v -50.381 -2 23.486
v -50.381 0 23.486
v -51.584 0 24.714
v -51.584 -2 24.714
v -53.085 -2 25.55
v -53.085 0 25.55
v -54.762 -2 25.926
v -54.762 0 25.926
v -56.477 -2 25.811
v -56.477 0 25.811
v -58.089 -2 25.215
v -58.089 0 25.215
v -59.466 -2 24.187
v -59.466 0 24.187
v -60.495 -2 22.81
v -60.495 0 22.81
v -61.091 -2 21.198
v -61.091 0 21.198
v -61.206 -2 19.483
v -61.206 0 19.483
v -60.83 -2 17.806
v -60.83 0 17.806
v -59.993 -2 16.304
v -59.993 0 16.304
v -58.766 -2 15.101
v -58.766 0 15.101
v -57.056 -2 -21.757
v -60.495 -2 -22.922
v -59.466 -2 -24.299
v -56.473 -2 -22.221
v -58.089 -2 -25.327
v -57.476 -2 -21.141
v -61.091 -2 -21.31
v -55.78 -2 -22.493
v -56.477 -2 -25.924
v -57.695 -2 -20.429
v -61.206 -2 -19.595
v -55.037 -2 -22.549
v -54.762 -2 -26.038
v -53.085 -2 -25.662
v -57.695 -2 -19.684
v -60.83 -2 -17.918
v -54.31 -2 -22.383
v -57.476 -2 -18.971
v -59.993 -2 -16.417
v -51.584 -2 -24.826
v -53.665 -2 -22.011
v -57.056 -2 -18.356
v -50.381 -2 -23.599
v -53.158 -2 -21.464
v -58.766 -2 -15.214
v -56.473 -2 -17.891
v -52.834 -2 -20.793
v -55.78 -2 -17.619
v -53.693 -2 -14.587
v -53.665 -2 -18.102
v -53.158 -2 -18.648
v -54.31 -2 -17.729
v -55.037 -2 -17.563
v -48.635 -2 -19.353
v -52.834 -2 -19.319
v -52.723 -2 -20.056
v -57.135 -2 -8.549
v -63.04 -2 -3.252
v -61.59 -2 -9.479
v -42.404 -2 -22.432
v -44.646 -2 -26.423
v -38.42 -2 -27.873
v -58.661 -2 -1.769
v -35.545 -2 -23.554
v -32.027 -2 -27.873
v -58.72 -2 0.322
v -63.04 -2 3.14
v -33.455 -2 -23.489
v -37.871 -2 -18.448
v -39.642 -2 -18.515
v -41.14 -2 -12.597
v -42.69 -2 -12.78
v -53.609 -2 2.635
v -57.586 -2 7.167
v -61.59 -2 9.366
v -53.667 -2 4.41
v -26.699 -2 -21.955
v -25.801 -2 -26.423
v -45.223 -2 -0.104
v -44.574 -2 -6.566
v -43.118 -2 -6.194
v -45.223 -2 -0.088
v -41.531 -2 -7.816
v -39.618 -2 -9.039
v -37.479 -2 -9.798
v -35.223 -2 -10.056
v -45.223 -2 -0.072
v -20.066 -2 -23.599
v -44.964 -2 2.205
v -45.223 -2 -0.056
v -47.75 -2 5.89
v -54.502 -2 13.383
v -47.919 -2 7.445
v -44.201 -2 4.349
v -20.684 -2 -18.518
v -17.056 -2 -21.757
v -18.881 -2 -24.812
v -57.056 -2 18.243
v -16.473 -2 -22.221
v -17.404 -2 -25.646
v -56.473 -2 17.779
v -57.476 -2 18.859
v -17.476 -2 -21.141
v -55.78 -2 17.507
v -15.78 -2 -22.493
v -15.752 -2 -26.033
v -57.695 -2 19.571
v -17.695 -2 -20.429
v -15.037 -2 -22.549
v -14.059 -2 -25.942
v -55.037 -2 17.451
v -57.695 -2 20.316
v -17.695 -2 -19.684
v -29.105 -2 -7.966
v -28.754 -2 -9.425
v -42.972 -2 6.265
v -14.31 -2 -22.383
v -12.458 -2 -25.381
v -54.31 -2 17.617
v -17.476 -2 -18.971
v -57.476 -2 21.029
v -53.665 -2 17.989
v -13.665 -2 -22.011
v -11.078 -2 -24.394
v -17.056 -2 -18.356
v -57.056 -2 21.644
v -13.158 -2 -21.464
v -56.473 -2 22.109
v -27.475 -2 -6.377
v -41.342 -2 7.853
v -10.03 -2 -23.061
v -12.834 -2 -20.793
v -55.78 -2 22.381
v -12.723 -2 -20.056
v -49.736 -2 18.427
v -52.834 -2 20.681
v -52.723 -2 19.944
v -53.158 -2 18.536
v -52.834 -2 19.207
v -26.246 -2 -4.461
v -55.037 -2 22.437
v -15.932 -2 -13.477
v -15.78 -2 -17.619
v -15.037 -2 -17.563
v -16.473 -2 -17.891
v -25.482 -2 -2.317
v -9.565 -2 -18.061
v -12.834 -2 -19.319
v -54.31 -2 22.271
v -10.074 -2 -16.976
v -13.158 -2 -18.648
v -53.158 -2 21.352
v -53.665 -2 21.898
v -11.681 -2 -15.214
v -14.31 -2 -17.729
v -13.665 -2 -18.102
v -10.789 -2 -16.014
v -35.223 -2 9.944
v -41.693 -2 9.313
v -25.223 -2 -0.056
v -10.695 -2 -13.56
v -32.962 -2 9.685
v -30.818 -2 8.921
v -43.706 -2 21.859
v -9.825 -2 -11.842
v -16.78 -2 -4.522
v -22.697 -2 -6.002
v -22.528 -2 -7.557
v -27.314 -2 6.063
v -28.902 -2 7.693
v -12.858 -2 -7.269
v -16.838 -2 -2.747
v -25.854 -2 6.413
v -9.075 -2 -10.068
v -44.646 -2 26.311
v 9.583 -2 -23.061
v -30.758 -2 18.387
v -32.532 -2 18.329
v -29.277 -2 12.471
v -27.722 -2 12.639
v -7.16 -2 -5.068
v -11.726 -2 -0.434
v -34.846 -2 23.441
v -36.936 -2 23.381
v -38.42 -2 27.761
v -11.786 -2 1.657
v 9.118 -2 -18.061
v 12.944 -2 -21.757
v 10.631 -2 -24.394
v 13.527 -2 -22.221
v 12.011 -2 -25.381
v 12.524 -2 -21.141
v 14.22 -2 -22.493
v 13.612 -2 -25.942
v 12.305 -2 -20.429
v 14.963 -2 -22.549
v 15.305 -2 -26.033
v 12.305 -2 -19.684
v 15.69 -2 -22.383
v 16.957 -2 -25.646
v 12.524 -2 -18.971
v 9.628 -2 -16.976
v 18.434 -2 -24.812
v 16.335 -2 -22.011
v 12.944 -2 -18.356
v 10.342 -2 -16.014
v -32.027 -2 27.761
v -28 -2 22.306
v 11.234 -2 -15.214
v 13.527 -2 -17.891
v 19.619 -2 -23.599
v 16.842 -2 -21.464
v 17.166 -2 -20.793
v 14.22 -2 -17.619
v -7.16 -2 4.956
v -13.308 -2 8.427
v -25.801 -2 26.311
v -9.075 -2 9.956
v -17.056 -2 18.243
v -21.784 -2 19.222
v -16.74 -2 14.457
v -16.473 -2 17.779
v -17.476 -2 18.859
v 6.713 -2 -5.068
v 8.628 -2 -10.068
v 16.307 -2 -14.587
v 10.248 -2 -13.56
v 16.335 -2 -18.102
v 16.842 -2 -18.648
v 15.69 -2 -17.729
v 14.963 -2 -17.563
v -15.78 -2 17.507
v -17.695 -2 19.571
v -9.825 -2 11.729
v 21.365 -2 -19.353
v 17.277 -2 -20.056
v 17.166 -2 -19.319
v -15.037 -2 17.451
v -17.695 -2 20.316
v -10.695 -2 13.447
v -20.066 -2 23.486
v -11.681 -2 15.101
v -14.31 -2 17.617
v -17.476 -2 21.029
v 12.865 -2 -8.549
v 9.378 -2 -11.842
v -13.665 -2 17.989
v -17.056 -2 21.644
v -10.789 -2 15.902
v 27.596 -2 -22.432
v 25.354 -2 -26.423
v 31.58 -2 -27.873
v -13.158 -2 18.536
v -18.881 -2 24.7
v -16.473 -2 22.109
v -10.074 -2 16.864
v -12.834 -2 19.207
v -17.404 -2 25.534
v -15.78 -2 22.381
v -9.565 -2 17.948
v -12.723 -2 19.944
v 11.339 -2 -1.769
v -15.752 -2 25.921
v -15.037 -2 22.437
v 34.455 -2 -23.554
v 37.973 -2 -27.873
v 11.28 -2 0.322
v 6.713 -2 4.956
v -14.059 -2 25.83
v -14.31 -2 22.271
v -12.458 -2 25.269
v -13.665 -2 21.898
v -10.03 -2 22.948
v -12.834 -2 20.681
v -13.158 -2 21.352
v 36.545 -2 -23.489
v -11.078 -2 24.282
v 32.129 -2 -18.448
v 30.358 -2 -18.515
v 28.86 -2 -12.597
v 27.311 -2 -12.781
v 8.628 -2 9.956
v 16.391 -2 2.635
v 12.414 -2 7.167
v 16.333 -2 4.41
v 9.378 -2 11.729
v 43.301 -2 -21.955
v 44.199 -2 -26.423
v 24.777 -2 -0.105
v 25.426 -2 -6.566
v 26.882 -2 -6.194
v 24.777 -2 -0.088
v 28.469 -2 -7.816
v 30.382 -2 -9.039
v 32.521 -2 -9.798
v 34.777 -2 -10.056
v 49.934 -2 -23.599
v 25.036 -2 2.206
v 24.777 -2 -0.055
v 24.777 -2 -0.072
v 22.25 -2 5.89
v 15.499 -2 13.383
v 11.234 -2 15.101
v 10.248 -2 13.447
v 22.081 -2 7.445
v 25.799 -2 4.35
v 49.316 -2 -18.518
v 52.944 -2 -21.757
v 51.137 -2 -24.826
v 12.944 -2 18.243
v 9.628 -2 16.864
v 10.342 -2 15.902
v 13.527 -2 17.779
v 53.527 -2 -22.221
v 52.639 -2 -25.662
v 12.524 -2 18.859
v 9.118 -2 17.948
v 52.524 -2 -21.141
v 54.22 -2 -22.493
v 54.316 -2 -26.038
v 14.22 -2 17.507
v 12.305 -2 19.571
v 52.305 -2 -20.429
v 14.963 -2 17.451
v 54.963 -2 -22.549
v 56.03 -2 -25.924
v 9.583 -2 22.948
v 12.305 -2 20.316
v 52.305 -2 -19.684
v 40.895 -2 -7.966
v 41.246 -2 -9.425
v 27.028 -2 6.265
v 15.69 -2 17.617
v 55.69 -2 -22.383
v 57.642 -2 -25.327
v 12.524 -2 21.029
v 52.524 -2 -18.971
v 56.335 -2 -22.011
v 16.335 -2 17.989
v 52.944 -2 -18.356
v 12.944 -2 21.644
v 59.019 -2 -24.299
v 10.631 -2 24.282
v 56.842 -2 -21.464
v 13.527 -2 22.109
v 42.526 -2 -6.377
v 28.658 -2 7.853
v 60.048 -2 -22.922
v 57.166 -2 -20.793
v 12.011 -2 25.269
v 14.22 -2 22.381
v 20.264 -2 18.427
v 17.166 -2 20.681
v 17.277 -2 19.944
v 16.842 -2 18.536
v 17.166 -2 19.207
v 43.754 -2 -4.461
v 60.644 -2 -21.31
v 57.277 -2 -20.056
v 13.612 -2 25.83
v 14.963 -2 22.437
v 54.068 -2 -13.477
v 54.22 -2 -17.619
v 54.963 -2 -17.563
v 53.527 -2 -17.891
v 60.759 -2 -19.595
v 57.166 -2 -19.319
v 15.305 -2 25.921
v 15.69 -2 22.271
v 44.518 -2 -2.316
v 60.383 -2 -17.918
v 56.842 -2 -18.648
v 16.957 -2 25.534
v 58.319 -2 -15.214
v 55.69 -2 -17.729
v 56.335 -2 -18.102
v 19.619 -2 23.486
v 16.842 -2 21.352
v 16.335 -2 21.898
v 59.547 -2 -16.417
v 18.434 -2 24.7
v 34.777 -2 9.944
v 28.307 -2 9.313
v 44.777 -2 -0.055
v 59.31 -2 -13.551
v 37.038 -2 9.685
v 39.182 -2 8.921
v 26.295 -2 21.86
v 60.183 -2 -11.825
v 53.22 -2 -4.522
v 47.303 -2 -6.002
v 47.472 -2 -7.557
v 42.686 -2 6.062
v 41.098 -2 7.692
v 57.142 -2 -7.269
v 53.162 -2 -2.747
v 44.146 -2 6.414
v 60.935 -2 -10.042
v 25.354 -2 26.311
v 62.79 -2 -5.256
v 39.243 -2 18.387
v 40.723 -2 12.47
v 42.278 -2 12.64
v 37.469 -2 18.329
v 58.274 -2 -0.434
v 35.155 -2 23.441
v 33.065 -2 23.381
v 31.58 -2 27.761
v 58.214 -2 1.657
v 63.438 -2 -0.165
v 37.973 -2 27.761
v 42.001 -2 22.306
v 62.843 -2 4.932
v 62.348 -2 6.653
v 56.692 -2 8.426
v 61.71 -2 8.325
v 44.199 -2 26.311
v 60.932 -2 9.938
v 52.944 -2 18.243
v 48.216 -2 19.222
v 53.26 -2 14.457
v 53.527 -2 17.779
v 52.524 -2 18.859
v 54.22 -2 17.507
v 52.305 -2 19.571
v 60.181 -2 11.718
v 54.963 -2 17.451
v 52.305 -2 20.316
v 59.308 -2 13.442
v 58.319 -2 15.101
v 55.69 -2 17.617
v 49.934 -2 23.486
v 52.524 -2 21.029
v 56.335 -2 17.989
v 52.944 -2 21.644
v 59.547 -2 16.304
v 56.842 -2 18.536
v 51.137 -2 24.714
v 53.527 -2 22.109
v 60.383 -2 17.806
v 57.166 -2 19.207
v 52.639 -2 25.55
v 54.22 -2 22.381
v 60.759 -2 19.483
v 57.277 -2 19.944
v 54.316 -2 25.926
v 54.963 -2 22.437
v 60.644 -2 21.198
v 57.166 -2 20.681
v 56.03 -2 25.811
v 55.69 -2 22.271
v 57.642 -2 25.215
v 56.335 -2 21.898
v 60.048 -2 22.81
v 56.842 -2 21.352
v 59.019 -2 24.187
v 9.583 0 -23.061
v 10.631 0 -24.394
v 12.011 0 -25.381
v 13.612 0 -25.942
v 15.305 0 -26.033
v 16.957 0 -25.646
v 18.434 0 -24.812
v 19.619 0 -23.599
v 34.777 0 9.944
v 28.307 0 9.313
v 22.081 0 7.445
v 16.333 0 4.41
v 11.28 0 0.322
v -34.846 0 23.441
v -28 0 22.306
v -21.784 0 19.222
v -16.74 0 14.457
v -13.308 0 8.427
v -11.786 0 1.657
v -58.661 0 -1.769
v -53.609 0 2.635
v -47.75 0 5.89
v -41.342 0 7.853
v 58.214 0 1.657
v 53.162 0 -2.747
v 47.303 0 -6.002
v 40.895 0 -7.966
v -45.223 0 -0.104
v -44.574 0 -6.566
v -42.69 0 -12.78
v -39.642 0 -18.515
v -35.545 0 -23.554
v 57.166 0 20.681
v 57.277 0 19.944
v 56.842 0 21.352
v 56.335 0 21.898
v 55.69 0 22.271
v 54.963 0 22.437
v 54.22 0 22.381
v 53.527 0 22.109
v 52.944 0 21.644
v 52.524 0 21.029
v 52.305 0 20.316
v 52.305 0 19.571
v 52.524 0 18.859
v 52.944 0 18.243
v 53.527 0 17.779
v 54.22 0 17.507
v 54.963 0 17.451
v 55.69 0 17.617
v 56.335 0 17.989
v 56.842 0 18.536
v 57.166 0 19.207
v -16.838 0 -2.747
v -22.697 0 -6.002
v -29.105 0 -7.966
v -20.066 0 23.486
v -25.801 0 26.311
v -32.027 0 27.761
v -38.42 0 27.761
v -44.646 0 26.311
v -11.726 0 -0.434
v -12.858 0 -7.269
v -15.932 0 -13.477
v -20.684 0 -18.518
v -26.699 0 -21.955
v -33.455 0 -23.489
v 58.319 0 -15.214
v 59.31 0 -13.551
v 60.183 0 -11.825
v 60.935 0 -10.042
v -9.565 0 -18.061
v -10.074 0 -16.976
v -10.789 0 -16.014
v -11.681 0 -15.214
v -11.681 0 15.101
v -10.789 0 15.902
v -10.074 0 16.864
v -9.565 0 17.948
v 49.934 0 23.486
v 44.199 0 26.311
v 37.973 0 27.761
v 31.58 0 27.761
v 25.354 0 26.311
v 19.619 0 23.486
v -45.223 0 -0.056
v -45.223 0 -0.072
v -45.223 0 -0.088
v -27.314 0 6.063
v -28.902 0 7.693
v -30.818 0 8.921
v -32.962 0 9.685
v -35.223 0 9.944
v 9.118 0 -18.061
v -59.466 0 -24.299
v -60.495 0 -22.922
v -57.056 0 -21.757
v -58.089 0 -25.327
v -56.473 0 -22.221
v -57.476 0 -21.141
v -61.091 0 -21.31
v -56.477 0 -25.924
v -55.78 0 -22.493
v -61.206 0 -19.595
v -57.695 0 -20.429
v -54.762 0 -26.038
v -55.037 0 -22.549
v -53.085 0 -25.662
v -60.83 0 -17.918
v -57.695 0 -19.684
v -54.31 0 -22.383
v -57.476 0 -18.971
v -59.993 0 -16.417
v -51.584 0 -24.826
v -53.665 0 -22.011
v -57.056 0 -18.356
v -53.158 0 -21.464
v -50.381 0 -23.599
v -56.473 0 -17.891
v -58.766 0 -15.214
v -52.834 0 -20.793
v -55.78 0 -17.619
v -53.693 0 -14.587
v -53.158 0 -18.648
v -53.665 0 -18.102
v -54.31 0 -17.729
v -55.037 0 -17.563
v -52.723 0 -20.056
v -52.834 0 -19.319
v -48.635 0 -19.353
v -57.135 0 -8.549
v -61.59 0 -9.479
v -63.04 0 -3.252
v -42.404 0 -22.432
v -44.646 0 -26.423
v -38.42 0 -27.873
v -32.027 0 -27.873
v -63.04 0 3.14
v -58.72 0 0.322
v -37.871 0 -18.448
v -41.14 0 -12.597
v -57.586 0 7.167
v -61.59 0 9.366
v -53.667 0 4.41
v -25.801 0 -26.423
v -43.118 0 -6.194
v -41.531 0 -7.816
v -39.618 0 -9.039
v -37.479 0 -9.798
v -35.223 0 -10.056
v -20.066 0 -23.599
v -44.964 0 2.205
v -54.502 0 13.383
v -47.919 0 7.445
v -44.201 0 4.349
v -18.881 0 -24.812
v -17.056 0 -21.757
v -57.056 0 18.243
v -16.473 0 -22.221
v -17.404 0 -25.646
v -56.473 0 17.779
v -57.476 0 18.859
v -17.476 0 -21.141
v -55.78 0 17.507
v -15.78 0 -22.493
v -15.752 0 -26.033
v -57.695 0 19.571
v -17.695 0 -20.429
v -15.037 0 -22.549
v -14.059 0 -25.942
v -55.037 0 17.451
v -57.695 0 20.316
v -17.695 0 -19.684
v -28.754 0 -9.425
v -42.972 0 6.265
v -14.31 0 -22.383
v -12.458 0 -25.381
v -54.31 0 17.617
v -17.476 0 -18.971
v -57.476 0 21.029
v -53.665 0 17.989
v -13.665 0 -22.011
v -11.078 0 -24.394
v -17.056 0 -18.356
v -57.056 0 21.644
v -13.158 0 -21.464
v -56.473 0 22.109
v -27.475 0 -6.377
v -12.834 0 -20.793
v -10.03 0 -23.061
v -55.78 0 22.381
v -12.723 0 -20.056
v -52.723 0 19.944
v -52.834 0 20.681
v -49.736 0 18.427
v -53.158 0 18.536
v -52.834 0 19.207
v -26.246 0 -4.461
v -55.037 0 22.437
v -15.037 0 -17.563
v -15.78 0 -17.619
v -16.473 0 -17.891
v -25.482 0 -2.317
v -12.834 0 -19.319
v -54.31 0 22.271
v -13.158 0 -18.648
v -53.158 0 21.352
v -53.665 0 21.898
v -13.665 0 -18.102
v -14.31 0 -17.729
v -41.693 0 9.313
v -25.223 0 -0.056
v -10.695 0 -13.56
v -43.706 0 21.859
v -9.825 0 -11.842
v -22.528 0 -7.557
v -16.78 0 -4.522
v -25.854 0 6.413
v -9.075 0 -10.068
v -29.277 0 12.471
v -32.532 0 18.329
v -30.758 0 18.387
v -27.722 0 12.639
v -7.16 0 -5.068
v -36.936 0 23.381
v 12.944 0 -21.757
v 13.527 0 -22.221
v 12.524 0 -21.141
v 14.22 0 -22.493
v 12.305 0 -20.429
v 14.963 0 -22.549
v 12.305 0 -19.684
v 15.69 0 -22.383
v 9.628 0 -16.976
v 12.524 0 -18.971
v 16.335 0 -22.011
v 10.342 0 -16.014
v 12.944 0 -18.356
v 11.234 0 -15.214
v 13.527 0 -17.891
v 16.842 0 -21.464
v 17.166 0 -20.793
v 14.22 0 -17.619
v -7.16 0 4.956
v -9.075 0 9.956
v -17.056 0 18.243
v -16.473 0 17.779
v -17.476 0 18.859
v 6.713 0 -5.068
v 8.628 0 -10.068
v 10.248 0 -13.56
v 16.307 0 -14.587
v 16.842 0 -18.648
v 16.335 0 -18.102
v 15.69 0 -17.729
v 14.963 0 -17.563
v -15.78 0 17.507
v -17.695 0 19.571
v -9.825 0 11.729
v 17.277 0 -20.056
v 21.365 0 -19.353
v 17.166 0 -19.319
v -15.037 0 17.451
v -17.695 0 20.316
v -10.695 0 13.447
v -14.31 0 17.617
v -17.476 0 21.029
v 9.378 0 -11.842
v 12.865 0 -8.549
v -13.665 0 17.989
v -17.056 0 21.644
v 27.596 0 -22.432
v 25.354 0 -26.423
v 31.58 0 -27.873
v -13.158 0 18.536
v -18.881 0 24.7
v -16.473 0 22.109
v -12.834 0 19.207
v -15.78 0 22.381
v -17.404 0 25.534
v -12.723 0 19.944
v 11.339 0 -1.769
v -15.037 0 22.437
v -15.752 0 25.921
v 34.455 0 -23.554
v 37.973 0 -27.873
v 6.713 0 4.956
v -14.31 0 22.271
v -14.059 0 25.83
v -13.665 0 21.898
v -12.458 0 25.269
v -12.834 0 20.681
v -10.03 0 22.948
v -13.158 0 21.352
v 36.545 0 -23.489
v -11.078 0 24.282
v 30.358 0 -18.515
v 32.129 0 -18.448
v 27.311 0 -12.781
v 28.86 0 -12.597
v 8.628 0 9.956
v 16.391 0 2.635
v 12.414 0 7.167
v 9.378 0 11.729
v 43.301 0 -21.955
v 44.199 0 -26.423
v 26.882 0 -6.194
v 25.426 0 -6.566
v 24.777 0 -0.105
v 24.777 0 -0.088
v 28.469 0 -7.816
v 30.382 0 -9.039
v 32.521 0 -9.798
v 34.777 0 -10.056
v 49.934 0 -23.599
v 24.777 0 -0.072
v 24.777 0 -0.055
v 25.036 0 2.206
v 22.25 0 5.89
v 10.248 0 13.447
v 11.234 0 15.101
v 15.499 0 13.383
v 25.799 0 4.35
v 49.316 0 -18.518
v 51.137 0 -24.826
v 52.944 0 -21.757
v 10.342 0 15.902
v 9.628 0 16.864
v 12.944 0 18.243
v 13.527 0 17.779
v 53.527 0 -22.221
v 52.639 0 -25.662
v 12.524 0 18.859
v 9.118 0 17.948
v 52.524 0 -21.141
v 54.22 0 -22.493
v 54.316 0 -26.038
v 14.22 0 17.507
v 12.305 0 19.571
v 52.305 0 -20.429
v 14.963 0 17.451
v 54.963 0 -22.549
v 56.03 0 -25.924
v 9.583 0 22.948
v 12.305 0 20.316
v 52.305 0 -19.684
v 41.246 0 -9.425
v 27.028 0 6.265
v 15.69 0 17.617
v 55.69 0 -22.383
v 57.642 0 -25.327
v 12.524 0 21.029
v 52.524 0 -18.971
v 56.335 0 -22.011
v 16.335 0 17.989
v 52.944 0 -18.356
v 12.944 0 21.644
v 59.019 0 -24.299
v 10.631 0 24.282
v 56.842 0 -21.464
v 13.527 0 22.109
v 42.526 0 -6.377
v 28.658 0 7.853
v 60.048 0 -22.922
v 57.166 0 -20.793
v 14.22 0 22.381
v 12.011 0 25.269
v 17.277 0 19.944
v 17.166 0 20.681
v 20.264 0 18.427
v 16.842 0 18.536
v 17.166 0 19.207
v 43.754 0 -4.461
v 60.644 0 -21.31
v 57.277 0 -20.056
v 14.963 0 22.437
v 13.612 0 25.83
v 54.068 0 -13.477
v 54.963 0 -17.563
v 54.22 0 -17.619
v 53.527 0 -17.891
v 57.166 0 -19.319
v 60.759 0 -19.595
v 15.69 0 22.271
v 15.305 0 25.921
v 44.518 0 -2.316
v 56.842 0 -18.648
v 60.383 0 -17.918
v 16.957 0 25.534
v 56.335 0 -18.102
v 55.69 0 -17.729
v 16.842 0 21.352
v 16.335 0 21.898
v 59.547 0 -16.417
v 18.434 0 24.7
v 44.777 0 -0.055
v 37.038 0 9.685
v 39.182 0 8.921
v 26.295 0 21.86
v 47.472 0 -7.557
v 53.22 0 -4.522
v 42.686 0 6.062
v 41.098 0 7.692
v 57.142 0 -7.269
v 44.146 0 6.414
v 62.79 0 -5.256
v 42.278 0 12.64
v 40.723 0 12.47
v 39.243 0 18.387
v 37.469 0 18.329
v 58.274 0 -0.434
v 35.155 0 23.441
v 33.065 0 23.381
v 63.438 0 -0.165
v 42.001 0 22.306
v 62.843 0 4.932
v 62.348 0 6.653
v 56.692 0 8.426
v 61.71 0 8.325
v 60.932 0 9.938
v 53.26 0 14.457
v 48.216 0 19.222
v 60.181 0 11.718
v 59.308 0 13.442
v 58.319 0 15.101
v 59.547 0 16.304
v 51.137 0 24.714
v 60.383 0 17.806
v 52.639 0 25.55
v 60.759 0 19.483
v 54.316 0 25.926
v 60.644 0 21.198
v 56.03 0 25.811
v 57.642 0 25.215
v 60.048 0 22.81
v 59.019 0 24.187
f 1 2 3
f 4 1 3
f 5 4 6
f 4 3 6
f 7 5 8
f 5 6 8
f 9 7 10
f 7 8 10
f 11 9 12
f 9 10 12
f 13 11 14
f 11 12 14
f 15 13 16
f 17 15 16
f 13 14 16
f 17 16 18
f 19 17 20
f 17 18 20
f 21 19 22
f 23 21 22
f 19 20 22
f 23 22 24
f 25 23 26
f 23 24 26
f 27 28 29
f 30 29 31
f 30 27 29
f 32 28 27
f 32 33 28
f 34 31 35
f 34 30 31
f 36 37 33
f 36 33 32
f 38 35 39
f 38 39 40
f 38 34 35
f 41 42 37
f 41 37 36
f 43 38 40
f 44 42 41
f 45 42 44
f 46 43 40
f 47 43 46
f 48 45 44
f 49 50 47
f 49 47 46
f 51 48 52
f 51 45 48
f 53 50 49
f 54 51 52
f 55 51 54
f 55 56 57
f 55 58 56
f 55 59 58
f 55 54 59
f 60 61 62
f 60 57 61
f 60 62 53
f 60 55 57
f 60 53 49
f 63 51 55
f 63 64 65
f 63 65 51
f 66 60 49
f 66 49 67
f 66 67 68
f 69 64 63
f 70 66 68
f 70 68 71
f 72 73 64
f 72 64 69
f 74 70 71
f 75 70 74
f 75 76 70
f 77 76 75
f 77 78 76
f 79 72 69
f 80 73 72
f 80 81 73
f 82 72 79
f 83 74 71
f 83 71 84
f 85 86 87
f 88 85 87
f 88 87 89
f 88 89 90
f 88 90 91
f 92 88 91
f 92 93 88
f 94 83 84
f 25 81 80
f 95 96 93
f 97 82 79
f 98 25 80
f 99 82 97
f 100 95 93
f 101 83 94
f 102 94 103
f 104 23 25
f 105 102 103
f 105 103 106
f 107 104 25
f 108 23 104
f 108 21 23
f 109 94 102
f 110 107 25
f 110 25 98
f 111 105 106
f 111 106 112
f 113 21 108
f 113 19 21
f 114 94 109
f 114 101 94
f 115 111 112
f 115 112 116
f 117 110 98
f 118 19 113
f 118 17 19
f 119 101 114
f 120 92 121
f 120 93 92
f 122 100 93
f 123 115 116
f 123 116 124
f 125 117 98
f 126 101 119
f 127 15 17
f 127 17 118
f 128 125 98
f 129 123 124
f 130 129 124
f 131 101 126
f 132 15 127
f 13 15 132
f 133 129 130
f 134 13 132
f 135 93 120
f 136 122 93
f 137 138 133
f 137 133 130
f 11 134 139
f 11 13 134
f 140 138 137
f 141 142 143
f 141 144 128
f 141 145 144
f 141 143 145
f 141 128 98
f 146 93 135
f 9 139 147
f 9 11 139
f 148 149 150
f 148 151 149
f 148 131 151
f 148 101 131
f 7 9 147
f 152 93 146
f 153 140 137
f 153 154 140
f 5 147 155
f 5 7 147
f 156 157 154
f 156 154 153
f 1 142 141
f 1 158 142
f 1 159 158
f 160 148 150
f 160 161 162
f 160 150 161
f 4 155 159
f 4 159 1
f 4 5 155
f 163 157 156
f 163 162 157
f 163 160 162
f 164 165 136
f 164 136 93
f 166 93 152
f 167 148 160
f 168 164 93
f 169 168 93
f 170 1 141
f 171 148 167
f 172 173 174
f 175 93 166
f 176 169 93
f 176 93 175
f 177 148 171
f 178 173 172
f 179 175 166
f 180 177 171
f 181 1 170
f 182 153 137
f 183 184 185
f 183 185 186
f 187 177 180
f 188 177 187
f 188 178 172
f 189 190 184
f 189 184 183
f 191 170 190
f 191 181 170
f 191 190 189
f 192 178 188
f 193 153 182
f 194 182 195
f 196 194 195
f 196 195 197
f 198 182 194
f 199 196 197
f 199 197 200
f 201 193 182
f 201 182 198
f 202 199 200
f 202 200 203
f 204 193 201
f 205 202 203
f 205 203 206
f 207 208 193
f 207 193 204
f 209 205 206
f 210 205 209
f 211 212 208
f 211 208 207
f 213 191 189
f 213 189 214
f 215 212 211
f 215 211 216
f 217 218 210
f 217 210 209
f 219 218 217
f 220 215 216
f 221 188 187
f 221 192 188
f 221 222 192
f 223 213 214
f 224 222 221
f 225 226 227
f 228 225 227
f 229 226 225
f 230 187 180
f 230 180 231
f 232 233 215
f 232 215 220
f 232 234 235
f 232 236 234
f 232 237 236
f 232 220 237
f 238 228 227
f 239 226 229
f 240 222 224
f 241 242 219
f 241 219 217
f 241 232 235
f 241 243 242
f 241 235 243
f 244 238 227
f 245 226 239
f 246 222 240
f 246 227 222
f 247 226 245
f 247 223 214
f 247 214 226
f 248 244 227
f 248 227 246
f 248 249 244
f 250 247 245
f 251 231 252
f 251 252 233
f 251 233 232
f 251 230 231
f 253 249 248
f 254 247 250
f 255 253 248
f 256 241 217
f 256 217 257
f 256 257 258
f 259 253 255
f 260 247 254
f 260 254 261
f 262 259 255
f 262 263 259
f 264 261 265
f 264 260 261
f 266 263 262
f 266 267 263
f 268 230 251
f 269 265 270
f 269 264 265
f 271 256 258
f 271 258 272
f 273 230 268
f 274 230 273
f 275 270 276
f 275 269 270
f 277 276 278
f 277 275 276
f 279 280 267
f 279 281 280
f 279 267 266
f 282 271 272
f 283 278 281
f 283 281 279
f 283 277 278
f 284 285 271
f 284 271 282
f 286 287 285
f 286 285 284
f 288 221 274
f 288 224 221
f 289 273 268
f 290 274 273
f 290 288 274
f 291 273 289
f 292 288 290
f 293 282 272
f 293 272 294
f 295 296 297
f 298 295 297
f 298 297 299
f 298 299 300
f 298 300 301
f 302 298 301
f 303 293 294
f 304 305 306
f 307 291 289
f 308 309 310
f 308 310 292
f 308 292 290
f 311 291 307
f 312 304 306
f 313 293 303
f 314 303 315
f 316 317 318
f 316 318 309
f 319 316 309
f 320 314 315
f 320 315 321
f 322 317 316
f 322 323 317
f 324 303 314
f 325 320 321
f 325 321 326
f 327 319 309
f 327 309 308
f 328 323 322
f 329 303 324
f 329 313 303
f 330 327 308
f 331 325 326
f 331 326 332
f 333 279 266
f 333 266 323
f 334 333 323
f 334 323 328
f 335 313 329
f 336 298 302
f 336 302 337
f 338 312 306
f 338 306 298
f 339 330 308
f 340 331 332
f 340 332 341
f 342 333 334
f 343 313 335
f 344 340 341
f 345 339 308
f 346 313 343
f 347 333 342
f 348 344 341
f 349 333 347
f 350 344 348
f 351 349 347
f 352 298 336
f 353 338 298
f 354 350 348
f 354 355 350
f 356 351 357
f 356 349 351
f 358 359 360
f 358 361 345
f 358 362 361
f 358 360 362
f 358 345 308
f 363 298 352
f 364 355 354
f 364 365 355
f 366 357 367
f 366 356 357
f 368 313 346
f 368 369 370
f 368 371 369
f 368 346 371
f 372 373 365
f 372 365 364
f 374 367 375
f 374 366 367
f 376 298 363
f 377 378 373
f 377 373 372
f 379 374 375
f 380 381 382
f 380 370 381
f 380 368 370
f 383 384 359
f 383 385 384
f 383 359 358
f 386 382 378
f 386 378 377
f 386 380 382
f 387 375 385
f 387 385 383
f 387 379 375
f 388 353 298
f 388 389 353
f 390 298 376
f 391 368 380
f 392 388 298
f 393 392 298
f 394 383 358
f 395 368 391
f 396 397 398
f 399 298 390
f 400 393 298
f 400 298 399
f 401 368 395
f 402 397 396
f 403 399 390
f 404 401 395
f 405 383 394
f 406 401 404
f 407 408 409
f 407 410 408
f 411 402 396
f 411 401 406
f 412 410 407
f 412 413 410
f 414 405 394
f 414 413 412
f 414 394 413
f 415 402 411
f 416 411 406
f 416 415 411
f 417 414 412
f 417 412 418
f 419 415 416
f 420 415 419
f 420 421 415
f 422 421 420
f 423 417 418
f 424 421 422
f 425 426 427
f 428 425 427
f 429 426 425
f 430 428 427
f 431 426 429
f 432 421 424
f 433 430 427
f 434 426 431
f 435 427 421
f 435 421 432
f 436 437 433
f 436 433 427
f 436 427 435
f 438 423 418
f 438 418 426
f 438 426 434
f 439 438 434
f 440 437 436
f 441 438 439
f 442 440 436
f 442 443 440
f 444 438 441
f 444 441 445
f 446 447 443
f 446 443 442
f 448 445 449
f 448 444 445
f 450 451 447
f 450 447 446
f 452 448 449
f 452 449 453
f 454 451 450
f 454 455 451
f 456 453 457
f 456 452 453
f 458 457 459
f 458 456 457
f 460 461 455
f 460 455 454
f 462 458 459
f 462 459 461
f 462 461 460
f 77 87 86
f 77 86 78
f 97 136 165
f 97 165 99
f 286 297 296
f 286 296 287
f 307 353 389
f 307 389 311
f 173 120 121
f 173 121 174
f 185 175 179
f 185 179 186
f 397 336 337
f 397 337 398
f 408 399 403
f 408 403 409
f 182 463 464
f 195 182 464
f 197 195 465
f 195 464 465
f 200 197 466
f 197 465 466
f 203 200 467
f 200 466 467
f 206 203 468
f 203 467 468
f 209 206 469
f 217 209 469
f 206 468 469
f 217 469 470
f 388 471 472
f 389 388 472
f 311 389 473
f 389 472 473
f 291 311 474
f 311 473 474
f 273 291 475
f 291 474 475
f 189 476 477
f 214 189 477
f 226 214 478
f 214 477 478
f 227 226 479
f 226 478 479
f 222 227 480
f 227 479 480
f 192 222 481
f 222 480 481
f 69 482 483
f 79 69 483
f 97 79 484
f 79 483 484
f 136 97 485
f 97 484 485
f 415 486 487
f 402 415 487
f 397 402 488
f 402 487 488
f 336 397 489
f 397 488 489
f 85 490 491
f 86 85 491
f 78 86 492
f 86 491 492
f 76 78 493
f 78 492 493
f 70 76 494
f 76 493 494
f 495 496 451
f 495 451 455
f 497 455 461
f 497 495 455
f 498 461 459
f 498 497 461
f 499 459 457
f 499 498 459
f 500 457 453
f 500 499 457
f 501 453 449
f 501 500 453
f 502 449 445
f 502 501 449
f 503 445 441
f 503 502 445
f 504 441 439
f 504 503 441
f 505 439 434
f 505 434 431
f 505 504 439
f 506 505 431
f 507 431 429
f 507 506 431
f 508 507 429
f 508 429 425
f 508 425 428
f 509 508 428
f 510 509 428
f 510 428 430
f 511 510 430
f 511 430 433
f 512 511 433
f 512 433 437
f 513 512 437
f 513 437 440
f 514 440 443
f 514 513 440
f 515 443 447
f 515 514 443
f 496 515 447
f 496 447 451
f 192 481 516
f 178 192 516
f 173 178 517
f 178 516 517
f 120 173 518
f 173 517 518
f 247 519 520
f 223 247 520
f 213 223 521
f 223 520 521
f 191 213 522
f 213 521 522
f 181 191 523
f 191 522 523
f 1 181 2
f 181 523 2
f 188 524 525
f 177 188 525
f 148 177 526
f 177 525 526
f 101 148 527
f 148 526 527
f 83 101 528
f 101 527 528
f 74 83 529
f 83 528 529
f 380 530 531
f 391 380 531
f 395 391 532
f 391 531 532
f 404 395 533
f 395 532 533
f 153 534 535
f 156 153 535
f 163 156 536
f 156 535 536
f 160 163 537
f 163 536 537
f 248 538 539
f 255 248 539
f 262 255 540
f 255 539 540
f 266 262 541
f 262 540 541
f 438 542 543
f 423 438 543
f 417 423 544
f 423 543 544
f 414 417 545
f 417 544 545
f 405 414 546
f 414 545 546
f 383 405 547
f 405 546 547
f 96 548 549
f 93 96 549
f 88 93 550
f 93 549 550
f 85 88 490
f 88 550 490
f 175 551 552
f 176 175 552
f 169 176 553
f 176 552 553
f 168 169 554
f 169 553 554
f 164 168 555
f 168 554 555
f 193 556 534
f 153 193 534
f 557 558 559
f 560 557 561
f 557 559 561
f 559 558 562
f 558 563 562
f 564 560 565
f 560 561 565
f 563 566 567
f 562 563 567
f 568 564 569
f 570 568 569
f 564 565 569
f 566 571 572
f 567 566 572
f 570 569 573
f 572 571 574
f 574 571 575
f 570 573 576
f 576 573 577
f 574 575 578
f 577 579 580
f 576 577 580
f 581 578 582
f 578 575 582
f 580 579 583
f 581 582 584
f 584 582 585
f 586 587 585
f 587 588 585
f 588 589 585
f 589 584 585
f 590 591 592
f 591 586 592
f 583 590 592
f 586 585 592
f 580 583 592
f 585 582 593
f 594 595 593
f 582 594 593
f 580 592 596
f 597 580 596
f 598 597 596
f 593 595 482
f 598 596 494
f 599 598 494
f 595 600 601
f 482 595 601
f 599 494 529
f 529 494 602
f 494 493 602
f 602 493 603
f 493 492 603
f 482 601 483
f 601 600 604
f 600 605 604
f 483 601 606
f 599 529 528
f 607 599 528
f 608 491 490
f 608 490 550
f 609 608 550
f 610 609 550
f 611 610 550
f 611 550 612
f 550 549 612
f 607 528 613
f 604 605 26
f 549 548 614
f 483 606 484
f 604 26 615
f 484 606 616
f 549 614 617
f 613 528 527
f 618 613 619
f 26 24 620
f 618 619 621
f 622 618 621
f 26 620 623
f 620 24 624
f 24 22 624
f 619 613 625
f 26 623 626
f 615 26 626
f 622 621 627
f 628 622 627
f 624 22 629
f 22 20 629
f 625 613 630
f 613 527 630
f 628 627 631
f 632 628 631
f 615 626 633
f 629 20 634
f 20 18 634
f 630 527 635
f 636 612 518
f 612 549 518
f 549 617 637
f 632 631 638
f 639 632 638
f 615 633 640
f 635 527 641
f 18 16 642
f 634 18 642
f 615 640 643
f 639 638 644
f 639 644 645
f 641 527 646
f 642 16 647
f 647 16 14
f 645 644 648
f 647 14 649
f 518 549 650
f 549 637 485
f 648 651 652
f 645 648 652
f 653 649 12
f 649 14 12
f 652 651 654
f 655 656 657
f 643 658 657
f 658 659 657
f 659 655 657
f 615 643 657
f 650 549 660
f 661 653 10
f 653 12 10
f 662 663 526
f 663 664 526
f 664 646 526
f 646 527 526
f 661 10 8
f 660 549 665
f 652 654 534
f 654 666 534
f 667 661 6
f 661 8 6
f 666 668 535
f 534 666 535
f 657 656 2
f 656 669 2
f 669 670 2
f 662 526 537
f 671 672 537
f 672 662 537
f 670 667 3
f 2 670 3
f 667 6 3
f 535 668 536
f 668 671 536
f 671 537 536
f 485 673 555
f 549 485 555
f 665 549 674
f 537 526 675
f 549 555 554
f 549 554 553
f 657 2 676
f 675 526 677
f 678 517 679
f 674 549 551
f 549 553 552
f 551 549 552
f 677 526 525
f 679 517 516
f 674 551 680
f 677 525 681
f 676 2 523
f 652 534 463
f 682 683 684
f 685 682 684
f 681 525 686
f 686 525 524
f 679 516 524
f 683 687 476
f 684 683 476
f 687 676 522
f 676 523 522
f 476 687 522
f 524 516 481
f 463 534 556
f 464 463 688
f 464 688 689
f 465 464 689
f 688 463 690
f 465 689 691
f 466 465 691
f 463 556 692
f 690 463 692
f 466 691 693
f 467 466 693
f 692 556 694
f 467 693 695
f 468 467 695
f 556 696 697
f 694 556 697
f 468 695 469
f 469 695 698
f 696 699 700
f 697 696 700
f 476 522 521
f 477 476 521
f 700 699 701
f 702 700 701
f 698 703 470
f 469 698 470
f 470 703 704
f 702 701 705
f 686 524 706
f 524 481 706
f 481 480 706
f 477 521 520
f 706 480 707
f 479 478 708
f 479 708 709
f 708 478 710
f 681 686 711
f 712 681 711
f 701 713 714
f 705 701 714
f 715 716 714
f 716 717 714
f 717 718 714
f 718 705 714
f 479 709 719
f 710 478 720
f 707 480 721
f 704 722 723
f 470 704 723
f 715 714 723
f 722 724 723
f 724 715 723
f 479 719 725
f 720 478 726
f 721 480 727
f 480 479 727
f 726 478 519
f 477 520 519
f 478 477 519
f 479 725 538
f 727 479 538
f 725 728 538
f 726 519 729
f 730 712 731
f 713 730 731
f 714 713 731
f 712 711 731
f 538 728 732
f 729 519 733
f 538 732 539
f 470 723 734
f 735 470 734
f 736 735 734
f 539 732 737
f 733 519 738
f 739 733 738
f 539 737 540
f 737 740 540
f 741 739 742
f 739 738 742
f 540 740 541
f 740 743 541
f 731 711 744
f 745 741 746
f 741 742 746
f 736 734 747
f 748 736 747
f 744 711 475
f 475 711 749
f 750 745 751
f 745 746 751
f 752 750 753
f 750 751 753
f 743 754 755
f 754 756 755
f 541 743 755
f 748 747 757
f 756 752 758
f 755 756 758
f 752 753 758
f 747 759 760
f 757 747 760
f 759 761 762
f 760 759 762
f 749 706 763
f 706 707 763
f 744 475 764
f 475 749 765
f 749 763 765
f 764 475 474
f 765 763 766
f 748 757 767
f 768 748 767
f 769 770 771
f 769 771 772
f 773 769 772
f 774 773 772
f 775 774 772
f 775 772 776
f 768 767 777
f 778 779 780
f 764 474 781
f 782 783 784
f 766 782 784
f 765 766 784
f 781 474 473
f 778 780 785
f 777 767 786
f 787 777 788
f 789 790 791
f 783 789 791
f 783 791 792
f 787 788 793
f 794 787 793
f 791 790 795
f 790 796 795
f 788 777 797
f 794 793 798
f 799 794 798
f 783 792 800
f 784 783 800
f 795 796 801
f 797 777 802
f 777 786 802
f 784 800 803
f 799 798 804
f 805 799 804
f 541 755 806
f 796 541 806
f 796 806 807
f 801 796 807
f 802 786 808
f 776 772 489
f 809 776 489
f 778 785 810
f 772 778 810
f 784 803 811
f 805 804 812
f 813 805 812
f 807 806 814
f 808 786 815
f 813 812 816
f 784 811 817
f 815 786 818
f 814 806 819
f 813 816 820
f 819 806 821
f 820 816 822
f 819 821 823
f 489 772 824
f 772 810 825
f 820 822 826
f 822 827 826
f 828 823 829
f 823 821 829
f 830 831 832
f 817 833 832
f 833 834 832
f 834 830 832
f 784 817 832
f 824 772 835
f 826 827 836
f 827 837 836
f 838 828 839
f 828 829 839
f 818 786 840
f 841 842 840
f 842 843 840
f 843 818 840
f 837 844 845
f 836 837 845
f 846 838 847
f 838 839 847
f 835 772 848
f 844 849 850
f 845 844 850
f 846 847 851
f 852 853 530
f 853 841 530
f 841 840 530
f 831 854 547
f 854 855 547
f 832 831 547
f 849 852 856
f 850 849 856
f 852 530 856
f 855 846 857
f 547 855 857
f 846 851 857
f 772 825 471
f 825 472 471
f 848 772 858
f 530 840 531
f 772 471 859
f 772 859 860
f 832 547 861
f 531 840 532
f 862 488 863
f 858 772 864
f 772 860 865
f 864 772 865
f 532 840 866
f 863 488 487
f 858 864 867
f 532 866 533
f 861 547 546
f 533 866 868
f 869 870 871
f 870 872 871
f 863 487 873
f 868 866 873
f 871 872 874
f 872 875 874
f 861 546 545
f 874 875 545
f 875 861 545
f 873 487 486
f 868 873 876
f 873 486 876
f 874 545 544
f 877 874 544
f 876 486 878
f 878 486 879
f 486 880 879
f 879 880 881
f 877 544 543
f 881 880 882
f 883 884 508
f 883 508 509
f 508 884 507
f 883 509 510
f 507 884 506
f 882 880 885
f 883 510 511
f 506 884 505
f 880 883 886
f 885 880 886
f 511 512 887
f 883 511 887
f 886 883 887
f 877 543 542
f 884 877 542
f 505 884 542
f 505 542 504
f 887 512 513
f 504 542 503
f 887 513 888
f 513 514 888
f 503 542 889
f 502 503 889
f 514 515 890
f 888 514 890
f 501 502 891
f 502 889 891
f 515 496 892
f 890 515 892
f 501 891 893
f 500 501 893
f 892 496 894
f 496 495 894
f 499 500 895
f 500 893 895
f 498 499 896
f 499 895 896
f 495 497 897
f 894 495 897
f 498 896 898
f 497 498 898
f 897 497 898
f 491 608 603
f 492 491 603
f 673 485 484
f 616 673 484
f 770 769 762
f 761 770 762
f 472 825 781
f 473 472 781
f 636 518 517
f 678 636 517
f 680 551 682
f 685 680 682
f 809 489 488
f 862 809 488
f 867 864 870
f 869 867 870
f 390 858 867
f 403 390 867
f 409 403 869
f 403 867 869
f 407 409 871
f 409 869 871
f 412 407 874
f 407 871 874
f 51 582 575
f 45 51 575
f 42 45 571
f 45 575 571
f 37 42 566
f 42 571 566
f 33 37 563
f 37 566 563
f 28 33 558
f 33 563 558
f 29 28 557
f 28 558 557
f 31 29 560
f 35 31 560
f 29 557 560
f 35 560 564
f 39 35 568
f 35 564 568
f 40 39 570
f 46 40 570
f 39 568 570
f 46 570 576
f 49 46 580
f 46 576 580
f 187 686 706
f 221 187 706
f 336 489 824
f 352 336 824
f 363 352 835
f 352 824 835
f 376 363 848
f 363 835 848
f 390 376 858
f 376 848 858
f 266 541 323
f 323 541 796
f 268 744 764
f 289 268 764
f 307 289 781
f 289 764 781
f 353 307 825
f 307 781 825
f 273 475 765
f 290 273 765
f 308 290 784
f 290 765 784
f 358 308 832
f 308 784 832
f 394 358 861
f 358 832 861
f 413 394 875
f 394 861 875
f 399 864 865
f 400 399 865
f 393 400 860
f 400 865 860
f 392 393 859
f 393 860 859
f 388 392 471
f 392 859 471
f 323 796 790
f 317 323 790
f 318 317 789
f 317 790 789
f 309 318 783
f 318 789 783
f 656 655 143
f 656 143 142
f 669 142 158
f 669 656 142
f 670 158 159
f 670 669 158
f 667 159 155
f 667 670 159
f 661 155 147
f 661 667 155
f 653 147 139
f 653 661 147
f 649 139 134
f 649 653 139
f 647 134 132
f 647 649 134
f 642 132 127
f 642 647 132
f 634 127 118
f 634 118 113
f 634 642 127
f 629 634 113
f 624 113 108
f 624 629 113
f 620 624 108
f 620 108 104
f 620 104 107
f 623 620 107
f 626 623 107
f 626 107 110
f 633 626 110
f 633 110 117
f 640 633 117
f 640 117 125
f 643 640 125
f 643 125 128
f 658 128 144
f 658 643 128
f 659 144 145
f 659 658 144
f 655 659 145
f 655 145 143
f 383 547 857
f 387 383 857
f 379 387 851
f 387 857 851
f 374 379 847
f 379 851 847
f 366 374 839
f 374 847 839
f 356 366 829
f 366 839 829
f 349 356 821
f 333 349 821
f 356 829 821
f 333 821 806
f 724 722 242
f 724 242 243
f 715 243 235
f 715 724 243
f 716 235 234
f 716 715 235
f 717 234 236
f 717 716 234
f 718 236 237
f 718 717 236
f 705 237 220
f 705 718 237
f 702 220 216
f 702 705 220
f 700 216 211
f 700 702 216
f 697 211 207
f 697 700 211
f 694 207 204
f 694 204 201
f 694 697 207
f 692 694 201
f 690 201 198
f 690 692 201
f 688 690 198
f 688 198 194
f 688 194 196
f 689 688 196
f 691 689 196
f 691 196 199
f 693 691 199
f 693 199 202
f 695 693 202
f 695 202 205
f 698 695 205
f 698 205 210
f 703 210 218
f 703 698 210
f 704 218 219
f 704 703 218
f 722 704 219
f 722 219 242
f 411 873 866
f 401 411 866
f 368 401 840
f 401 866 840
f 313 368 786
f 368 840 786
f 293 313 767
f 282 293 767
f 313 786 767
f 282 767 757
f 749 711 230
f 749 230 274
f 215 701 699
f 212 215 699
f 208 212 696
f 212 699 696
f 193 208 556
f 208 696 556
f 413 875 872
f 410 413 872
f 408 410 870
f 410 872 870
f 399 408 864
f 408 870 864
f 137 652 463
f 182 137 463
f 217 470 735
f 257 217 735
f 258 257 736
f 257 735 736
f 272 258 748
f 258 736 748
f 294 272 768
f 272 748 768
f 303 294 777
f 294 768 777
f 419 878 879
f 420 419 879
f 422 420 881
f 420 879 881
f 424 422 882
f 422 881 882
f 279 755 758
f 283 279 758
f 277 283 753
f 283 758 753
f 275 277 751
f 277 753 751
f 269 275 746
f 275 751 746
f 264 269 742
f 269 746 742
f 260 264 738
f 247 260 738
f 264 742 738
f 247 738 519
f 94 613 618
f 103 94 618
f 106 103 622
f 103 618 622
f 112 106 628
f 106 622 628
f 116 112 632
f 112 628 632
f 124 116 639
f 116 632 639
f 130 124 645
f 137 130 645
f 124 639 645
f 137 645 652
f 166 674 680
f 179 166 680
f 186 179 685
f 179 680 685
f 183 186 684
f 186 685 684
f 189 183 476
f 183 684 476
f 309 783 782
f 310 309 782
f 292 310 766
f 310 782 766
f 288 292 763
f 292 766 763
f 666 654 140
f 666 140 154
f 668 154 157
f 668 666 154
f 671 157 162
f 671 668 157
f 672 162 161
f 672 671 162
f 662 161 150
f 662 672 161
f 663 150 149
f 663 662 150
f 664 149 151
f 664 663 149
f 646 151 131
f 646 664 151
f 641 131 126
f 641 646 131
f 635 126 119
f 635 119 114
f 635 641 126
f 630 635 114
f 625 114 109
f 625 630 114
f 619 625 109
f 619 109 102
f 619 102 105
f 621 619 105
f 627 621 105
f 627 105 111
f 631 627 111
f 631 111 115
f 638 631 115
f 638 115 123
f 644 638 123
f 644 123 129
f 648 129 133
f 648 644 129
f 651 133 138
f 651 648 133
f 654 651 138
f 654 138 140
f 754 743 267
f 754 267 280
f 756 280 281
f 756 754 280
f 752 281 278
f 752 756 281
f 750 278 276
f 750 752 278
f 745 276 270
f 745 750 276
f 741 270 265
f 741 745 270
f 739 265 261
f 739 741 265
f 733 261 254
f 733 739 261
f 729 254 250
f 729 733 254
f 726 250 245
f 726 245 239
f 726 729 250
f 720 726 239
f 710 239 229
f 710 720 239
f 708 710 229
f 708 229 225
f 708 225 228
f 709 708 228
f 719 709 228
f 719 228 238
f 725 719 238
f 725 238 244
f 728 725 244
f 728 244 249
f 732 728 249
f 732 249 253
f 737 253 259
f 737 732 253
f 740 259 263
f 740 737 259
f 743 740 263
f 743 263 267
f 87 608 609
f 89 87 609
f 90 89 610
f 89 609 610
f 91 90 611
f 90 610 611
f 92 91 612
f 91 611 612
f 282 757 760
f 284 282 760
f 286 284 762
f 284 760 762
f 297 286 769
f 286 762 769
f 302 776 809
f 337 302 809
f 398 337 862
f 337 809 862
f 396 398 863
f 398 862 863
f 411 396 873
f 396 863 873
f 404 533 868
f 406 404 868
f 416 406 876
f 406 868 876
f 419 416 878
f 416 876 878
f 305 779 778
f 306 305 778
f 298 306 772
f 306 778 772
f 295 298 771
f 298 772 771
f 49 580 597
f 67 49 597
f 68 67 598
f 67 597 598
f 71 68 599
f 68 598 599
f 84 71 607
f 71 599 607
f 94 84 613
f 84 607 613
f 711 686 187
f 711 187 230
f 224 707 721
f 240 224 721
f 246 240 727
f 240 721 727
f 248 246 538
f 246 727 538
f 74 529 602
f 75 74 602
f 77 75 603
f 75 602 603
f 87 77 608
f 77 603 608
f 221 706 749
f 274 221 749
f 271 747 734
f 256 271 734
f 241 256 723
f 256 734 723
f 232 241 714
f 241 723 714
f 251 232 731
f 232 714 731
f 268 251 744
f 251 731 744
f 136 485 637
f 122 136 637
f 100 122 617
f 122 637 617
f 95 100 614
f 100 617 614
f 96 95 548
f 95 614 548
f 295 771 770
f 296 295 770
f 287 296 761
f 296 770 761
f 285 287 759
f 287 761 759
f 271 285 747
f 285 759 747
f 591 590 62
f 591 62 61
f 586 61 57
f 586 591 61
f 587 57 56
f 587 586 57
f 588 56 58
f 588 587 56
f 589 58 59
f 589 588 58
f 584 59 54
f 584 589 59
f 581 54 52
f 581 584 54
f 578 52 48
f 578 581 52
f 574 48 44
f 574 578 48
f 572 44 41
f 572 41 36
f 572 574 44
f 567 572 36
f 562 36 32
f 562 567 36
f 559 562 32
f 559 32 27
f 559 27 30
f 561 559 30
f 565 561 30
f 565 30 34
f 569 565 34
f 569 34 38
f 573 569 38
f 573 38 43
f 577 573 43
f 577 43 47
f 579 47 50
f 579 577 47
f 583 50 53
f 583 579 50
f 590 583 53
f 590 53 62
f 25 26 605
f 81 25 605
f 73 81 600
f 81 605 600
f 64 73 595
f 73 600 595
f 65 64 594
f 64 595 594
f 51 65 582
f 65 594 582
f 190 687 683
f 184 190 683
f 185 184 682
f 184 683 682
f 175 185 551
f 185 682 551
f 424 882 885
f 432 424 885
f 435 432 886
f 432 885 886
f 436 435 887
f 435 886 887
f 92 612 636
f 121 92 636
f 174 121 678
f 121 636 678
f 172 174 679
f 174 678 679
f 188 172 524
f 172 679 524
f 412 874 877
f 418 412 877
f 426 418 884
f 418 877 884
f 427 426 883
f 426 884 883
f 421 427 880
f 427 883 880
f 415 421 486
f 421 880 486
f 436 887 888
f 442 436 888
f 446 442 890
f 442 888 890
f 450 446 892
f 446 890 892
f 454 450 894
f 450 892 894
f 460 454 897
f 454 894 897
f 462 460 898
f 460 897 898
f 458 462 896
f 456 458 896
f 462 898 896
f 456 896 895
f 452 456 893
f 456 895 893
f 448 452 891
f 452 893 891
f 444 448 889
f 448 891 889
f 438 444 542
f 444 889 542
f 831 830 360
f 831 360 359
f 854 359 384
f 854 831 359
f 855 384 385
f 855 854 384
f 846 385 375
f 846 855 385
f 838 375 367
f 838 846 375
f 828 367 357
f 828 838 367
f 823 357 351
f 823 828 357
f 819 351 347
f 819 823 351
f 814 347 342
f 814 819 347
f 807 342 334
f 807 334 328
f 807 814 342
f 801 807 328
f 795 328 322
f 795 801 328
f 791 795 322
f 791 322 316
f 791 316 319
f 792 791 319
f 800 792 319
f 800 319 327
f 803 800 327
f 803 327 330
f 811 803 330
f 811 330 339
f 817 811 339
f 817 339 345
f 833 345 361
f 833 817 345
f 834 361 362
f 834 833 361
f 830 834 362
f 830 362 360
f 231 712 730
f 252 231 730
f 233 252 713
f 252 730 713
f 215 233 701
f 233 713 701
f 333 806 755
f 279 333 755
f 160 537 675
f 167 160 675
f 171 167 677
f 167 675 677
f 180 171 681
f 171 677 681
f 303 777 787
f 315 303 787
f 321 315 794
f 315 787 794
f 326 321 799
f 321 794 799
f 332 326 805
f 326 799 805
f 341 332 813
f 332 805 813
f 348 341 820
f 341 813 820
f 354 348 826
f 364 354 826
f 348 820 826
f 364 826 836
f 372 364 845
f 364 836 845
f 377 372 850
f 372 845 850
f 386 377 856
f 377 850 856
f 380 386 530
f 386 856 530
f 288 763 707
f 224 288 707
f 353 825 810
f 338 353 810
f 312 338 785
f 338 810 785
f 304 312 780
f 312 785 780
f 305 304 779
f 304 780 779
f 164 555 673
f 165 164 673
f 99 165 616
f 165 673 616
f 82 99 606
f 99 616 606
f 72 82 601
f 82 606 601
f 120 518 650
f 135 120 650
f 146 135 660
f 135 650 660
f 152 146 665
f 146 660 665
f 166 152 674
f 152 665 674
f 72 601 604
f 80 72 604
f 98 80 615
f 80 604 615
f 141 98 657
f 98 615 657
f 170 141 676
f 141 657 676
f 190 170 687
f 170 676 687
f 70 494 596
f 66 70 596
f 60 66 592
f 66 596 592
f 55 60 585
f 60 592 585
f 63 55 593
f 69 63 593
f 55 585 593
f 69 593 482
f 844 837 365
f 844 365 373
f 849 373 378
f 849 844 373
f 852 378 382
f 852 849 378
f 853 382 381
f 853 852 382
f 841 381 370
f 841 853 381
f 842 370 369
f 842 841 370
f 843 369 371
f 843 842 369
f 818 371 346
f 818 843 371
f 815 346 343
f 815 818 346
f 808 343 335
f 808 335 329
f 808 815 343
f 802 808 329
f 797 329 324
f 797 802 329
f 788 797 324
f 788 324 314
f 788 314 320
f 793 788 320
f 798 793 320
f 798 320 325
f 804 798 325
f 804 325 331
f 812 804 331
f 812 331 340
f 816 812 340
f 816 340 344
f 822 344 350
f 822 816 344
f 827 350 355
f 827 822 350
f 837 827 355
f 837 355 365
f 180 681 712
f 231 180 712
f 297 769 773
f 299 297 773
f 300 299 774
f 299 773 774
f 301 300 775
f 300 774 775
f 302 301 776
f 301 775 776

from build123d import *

# Parameters (mm, degrees)
F0_R     = 2.5
F0_W     = 13.873467
F0_H     = 10.023556
F1_DEPTH = 2


with BuildPart() as f1:
    # F0 (on Front) → F1 (new body)
    with BuildSketch(Plane.XZ):
        with BuildLine():
            ThreePointArc((36.719143, 15.101325), (37.419231, 24.186519), (28.334037, 23.486431))
            ThreePointArc((28.334037, 23.486431), (13.17659, 27.943878), (-1.980857, 23.486431))
            ThreePointArc((-1.980857, 23.486431), (-7.144612, 25.935274), (-12.016955, 22.94839))
            Line((-12.016955, 22.94839), (-31.629865, 22.94839))
            ThreePointArc((-31.629865, 22.94839), (-36.502208, 25.935274), (-41.665963, 23.486431))
            ThreePointArc((-41.665963, 23.486431), (-56.82341, 27.943878), (-71.980857, 23.486431))
            ThreePointArc((-71.980857, 23.486431), (-81.066051, 24.186519), (-80.365963, 15.101325))
            ThreePointArc((-80.365963, 15.101325), (-84.82341, -0.056122), (-80.365963, -15.213569))
            ThreePointArc((-80.365963, -15.213569), (-81.066051, -24.298763), (-71.980857, -23.598675))
            ThreePointArc((-71.980857, -23.598675), (-56.82341, -28.056122), (-41.665963, -23.598675))
            ThreePointArc((-41.665963, -23.598675), (-36.502208, -26.047518), (-31.629865, -23.060634))
            Line((-31.629865, -23.060634), (-12.016955, -23.060634))
            ThreePointArc((-12.016955, -23.060634), (-7.144612, -26.047518), (-1.980857, -23.598675))
            ThreePointArc((-1.980857, -23.598675), (13.17659, -28.056122), (28.334037, -23.598675))
            ThreePointArc((28.334037, -23.598675), (37.419231, -24.298763), (36.719143, -15.213569))
            ThreePointArc((36.719143, -15.213569), (38.161421, -12.695672), (39.335368, -10.042029))
            ThreePointArc((39.335368, -10.042029), (41.668623, -2.730663), (41.24273, 4.932154))
            ThreePointArc((41.24273, 4.932154), (40.446435, 7.495779), (39.332206, 9.938063))
            ThreePointArc((39.332206, 9.938063), (38.159421, 12.587381), (36.719143, 15.101325))
        make_face()
        with Locations((-76.82341, -20.056122)):
            Circle(F0_R, mode=Mode.SUBTRACT)
        with Locations((-36.82341, -20.056122)):
            Circle(F0_R, mode=Mode.SUBTRACT)
        with BuildLine():
            ThreePointArc((-12.972297, -10.0679), (-11.801986, -12.708028), (-10.365963, -15.213569))
            ThreePointArc((-10.365963, -15.213569), (-11.639118, -16.477162), (-12.481857, -18.060634))
            Line((-12.481857, -18.060634), (-31.164963, -18.060634))
            ThreePointArc((-31.164963, -18.060634), (-32.007702, -16.477162), (-33.280857, -15.213569))
            ThreePointArc((-33.280857, -15.213569), (-31.844834, -12.708028), (-30.674523, -10.0679))
            Line((-30.674523, -10.0679), (-12.972297, -10.0679))
        make_face(mode=Mode.SUBTRACT)
        with BuildLine():
            ThreePointArc((-62.942122, 7.853453), (-65.800801, 4.349152), (-66.82341, -0.056122))
            ThreePointArc((-66.82341, -0.056122), (-66.823361, -0.080004), (-66.823296, -0.103885))
            ThreePointArc((-66.823296, -0.103885), (-64.289716, -12.78048), (-57.144925, -23.553922))
            ThreePointArc((-57.144925, -23.553922), (-72.940781, -17.158179), (-80.260911, -1.768888))
            ThreePointArc((-80.260911, -1.768888), (-72.36496, 4.416369), (-62.942122, 7.853453))
        make_face(mode=Mode.SUBTRACT)
        with BuildLine():
            ThreePointArc((-64.718322, -6.193741), (-61.217941, -9.038777), (-56.82341, -10.056122))
            ThreePointArc((-56.82341, -10.056122), (-44.12797, -7.557344), (-33.326445, -0.433782))
            ThreePointArc((-33.326445, -0.433782), (-39.721353, -16.173493), (-55.054649, -23.489463))
            ThreePointArc((-55.054649, -23.489463), (-61.25874, -15.608324), (-64.718322, -6.193741))
        make_face(mode=Mode.SUBTRACT)
        with Locations((-6.82341, -20.056122)):
            Circle(F0_R, mode=Mode.SUBTRACT)
        with Locations((33.17659, -20.056122)):
            Circle(F0_R, mode=Mode.SUBTRACT)
        with BuildLine():
            ThreePointArc((7.057878, 7.853453), (4.199459, 4.349684), (3.17659, -0.054937))
            ThreePointArc((3.17659, -0.054937), (3.176641, -0.080004), (3.17671, -0.10507))
            ThreePointArc((3.17671, -0.10507), (5.710512, -12.781028), (12.855078, -23.553922))
            ThreePointArc((12.855078, -23.553922), (-2.94078, -17.15818), (-10.260911, -1.768888))
            ThreePointArc((-10.260911, -1.768888), (-2.36496, 4.416369), (7.057878, 7.853453))
        make_face(mode=Mode.SUBTRACT)
        with BuildLine():
            ThreePointArc((5.281681, -6.193744), (8.782061, -9.038778), (13.17659, -10.056122))
            ThreePointArc((13.17659, -10.056122), (25.87203, -7.557344), (36.673555, -0.433782))
            ThreePointArc((36.673555, -0.433782), (30.278648, -16.173492), (14.945354, -23.489463))
            ThreePointArc((14.945354, -23.489463), (8.741263, -15.608326), (5.281681, -6.193744))
        make_face(mode=Mode.SUBTRACT)
        with BuildLine():
            ThreePointArc((-80.320375, 0.321538), (-73.9062, 16.081669), (-58.536176, 23.381379))
            ThreePointArc((-58.536176, 23.381379), (-52.350919, 15.485428), (-48.913835, 6.06259))
            ThreePointArc((-48.913835, 6.06259), (-52.418136, 8.92127), (-56.82341, 9.943878))
            ThreePointArc((-56.82341, 9.943878), (-69.51885, 7.445101), (-80.320375, 0.321538))
        make_face(mode=Mode.SUBTRACT)
        with Locations((-21.82341, -0.056122)):
            Rectangle(F0_W, F0_H, mode=Mode.SUBTRACT)
        with BuildLine():
            ThreePointArc((-50.704698, -7.965696), (-47.846018, -4.461396), (-46.82341, -0.056122))
            ThreePointArc((-46.82341, -0.056122), (-49.322187, 12.639318), (-56.44575, 23.440843))
            ThreePointArc((-56.44575, 23.440843), (-40.685619, 17.026668), (-33.385909, 1.656644))
            ThreePointArc((-33.385909, 1.656644), (-41.28186, -4.528612), (-50.704698, -7.965696))
        make_face(mode=Mode.SUBTRACT)
        with Locations((-76.82341, 19.943878)):
            Circle(F0_R, mode=Mode.SUBTRACT)
        with BuildLine():
            Line((-12.972297, 9.955656), (-30.674523, 9.955656))
            ThreePointArc((-30.674523, 9.955656), (-31.844834, 12.595784), (-33.280857, 15.101325))
            ThreePointArc((-33.280857, 15.101325), (-32.007702, 16.364918), (-31.164963, 17.94839))
            Line((-31.164963, 17.94839), (-12.481857, 17.94839))
            ThreePointArc((-12.481857, 17.94839), (-11.639118, 16.364918), (-10.365963, 15.101325))
            ThreePointArc((-10.365963, 15.101325), (-11.801986, 12.595784), (-12.972297, 9.955656))
        make_face(mode=Mode.SUBTRACT)
        with Locations((-36.82341, 19.943878)):
            Circle(F0_R, mode=Mode.SUBTRACT)
        with BuildLine():
            ThreePointArc((-10.320375, 0.321538), (-3.905793, 16.082099), (11.465005, 23.381465))
            ThreePointArc((11.465005, 23.381465), (17.649864, 15.485203), (21.086473, 6.062191))
            ThreePointArc((21.086473, 6.062191), (17.582091, 8.921159), (13.17659, 9.943878))
            ThreePointArc((13.17659, 9.943878), (0.48115, 7.445101), (-10.320375, 0.321538))
        make_face(mode=Mode.SUBTRACT)
        with BuildLine():
            ThreePointArc((19.295302, -7.965696), (22.154242, -4.460865), (23.17659, -0.054937))
            ThreePointArc((23.17659, -0.054937), (20.678132, 12.639721), (13.555434, 23.440824))
            ThreePointArc((13.555434, 23.440824), (29.314811, 17.026261), (36.614091, 1.656644))
            ThreePointArc((36.614091, 1.656644), (28.71814, -4.528612), (19.295302, -7.965696))
        make_face(mode=Mode.SUBTRACT)
        with Locations((-6.82341, 19.943878)):
            Circle(F0_R, mode=Mode.SUBTRACT)
        with Locations((33.17659, 19.943878)):
            Circle(F0_R, mode=Mode.SUBTRACT)
    extrude(amount=F1_DEPTH)


with BuildPart() as f1_1:
    # F2: moved
    add(f1.part.moved(Location((21.6, 0, 0))))


solid = f1_1.part
